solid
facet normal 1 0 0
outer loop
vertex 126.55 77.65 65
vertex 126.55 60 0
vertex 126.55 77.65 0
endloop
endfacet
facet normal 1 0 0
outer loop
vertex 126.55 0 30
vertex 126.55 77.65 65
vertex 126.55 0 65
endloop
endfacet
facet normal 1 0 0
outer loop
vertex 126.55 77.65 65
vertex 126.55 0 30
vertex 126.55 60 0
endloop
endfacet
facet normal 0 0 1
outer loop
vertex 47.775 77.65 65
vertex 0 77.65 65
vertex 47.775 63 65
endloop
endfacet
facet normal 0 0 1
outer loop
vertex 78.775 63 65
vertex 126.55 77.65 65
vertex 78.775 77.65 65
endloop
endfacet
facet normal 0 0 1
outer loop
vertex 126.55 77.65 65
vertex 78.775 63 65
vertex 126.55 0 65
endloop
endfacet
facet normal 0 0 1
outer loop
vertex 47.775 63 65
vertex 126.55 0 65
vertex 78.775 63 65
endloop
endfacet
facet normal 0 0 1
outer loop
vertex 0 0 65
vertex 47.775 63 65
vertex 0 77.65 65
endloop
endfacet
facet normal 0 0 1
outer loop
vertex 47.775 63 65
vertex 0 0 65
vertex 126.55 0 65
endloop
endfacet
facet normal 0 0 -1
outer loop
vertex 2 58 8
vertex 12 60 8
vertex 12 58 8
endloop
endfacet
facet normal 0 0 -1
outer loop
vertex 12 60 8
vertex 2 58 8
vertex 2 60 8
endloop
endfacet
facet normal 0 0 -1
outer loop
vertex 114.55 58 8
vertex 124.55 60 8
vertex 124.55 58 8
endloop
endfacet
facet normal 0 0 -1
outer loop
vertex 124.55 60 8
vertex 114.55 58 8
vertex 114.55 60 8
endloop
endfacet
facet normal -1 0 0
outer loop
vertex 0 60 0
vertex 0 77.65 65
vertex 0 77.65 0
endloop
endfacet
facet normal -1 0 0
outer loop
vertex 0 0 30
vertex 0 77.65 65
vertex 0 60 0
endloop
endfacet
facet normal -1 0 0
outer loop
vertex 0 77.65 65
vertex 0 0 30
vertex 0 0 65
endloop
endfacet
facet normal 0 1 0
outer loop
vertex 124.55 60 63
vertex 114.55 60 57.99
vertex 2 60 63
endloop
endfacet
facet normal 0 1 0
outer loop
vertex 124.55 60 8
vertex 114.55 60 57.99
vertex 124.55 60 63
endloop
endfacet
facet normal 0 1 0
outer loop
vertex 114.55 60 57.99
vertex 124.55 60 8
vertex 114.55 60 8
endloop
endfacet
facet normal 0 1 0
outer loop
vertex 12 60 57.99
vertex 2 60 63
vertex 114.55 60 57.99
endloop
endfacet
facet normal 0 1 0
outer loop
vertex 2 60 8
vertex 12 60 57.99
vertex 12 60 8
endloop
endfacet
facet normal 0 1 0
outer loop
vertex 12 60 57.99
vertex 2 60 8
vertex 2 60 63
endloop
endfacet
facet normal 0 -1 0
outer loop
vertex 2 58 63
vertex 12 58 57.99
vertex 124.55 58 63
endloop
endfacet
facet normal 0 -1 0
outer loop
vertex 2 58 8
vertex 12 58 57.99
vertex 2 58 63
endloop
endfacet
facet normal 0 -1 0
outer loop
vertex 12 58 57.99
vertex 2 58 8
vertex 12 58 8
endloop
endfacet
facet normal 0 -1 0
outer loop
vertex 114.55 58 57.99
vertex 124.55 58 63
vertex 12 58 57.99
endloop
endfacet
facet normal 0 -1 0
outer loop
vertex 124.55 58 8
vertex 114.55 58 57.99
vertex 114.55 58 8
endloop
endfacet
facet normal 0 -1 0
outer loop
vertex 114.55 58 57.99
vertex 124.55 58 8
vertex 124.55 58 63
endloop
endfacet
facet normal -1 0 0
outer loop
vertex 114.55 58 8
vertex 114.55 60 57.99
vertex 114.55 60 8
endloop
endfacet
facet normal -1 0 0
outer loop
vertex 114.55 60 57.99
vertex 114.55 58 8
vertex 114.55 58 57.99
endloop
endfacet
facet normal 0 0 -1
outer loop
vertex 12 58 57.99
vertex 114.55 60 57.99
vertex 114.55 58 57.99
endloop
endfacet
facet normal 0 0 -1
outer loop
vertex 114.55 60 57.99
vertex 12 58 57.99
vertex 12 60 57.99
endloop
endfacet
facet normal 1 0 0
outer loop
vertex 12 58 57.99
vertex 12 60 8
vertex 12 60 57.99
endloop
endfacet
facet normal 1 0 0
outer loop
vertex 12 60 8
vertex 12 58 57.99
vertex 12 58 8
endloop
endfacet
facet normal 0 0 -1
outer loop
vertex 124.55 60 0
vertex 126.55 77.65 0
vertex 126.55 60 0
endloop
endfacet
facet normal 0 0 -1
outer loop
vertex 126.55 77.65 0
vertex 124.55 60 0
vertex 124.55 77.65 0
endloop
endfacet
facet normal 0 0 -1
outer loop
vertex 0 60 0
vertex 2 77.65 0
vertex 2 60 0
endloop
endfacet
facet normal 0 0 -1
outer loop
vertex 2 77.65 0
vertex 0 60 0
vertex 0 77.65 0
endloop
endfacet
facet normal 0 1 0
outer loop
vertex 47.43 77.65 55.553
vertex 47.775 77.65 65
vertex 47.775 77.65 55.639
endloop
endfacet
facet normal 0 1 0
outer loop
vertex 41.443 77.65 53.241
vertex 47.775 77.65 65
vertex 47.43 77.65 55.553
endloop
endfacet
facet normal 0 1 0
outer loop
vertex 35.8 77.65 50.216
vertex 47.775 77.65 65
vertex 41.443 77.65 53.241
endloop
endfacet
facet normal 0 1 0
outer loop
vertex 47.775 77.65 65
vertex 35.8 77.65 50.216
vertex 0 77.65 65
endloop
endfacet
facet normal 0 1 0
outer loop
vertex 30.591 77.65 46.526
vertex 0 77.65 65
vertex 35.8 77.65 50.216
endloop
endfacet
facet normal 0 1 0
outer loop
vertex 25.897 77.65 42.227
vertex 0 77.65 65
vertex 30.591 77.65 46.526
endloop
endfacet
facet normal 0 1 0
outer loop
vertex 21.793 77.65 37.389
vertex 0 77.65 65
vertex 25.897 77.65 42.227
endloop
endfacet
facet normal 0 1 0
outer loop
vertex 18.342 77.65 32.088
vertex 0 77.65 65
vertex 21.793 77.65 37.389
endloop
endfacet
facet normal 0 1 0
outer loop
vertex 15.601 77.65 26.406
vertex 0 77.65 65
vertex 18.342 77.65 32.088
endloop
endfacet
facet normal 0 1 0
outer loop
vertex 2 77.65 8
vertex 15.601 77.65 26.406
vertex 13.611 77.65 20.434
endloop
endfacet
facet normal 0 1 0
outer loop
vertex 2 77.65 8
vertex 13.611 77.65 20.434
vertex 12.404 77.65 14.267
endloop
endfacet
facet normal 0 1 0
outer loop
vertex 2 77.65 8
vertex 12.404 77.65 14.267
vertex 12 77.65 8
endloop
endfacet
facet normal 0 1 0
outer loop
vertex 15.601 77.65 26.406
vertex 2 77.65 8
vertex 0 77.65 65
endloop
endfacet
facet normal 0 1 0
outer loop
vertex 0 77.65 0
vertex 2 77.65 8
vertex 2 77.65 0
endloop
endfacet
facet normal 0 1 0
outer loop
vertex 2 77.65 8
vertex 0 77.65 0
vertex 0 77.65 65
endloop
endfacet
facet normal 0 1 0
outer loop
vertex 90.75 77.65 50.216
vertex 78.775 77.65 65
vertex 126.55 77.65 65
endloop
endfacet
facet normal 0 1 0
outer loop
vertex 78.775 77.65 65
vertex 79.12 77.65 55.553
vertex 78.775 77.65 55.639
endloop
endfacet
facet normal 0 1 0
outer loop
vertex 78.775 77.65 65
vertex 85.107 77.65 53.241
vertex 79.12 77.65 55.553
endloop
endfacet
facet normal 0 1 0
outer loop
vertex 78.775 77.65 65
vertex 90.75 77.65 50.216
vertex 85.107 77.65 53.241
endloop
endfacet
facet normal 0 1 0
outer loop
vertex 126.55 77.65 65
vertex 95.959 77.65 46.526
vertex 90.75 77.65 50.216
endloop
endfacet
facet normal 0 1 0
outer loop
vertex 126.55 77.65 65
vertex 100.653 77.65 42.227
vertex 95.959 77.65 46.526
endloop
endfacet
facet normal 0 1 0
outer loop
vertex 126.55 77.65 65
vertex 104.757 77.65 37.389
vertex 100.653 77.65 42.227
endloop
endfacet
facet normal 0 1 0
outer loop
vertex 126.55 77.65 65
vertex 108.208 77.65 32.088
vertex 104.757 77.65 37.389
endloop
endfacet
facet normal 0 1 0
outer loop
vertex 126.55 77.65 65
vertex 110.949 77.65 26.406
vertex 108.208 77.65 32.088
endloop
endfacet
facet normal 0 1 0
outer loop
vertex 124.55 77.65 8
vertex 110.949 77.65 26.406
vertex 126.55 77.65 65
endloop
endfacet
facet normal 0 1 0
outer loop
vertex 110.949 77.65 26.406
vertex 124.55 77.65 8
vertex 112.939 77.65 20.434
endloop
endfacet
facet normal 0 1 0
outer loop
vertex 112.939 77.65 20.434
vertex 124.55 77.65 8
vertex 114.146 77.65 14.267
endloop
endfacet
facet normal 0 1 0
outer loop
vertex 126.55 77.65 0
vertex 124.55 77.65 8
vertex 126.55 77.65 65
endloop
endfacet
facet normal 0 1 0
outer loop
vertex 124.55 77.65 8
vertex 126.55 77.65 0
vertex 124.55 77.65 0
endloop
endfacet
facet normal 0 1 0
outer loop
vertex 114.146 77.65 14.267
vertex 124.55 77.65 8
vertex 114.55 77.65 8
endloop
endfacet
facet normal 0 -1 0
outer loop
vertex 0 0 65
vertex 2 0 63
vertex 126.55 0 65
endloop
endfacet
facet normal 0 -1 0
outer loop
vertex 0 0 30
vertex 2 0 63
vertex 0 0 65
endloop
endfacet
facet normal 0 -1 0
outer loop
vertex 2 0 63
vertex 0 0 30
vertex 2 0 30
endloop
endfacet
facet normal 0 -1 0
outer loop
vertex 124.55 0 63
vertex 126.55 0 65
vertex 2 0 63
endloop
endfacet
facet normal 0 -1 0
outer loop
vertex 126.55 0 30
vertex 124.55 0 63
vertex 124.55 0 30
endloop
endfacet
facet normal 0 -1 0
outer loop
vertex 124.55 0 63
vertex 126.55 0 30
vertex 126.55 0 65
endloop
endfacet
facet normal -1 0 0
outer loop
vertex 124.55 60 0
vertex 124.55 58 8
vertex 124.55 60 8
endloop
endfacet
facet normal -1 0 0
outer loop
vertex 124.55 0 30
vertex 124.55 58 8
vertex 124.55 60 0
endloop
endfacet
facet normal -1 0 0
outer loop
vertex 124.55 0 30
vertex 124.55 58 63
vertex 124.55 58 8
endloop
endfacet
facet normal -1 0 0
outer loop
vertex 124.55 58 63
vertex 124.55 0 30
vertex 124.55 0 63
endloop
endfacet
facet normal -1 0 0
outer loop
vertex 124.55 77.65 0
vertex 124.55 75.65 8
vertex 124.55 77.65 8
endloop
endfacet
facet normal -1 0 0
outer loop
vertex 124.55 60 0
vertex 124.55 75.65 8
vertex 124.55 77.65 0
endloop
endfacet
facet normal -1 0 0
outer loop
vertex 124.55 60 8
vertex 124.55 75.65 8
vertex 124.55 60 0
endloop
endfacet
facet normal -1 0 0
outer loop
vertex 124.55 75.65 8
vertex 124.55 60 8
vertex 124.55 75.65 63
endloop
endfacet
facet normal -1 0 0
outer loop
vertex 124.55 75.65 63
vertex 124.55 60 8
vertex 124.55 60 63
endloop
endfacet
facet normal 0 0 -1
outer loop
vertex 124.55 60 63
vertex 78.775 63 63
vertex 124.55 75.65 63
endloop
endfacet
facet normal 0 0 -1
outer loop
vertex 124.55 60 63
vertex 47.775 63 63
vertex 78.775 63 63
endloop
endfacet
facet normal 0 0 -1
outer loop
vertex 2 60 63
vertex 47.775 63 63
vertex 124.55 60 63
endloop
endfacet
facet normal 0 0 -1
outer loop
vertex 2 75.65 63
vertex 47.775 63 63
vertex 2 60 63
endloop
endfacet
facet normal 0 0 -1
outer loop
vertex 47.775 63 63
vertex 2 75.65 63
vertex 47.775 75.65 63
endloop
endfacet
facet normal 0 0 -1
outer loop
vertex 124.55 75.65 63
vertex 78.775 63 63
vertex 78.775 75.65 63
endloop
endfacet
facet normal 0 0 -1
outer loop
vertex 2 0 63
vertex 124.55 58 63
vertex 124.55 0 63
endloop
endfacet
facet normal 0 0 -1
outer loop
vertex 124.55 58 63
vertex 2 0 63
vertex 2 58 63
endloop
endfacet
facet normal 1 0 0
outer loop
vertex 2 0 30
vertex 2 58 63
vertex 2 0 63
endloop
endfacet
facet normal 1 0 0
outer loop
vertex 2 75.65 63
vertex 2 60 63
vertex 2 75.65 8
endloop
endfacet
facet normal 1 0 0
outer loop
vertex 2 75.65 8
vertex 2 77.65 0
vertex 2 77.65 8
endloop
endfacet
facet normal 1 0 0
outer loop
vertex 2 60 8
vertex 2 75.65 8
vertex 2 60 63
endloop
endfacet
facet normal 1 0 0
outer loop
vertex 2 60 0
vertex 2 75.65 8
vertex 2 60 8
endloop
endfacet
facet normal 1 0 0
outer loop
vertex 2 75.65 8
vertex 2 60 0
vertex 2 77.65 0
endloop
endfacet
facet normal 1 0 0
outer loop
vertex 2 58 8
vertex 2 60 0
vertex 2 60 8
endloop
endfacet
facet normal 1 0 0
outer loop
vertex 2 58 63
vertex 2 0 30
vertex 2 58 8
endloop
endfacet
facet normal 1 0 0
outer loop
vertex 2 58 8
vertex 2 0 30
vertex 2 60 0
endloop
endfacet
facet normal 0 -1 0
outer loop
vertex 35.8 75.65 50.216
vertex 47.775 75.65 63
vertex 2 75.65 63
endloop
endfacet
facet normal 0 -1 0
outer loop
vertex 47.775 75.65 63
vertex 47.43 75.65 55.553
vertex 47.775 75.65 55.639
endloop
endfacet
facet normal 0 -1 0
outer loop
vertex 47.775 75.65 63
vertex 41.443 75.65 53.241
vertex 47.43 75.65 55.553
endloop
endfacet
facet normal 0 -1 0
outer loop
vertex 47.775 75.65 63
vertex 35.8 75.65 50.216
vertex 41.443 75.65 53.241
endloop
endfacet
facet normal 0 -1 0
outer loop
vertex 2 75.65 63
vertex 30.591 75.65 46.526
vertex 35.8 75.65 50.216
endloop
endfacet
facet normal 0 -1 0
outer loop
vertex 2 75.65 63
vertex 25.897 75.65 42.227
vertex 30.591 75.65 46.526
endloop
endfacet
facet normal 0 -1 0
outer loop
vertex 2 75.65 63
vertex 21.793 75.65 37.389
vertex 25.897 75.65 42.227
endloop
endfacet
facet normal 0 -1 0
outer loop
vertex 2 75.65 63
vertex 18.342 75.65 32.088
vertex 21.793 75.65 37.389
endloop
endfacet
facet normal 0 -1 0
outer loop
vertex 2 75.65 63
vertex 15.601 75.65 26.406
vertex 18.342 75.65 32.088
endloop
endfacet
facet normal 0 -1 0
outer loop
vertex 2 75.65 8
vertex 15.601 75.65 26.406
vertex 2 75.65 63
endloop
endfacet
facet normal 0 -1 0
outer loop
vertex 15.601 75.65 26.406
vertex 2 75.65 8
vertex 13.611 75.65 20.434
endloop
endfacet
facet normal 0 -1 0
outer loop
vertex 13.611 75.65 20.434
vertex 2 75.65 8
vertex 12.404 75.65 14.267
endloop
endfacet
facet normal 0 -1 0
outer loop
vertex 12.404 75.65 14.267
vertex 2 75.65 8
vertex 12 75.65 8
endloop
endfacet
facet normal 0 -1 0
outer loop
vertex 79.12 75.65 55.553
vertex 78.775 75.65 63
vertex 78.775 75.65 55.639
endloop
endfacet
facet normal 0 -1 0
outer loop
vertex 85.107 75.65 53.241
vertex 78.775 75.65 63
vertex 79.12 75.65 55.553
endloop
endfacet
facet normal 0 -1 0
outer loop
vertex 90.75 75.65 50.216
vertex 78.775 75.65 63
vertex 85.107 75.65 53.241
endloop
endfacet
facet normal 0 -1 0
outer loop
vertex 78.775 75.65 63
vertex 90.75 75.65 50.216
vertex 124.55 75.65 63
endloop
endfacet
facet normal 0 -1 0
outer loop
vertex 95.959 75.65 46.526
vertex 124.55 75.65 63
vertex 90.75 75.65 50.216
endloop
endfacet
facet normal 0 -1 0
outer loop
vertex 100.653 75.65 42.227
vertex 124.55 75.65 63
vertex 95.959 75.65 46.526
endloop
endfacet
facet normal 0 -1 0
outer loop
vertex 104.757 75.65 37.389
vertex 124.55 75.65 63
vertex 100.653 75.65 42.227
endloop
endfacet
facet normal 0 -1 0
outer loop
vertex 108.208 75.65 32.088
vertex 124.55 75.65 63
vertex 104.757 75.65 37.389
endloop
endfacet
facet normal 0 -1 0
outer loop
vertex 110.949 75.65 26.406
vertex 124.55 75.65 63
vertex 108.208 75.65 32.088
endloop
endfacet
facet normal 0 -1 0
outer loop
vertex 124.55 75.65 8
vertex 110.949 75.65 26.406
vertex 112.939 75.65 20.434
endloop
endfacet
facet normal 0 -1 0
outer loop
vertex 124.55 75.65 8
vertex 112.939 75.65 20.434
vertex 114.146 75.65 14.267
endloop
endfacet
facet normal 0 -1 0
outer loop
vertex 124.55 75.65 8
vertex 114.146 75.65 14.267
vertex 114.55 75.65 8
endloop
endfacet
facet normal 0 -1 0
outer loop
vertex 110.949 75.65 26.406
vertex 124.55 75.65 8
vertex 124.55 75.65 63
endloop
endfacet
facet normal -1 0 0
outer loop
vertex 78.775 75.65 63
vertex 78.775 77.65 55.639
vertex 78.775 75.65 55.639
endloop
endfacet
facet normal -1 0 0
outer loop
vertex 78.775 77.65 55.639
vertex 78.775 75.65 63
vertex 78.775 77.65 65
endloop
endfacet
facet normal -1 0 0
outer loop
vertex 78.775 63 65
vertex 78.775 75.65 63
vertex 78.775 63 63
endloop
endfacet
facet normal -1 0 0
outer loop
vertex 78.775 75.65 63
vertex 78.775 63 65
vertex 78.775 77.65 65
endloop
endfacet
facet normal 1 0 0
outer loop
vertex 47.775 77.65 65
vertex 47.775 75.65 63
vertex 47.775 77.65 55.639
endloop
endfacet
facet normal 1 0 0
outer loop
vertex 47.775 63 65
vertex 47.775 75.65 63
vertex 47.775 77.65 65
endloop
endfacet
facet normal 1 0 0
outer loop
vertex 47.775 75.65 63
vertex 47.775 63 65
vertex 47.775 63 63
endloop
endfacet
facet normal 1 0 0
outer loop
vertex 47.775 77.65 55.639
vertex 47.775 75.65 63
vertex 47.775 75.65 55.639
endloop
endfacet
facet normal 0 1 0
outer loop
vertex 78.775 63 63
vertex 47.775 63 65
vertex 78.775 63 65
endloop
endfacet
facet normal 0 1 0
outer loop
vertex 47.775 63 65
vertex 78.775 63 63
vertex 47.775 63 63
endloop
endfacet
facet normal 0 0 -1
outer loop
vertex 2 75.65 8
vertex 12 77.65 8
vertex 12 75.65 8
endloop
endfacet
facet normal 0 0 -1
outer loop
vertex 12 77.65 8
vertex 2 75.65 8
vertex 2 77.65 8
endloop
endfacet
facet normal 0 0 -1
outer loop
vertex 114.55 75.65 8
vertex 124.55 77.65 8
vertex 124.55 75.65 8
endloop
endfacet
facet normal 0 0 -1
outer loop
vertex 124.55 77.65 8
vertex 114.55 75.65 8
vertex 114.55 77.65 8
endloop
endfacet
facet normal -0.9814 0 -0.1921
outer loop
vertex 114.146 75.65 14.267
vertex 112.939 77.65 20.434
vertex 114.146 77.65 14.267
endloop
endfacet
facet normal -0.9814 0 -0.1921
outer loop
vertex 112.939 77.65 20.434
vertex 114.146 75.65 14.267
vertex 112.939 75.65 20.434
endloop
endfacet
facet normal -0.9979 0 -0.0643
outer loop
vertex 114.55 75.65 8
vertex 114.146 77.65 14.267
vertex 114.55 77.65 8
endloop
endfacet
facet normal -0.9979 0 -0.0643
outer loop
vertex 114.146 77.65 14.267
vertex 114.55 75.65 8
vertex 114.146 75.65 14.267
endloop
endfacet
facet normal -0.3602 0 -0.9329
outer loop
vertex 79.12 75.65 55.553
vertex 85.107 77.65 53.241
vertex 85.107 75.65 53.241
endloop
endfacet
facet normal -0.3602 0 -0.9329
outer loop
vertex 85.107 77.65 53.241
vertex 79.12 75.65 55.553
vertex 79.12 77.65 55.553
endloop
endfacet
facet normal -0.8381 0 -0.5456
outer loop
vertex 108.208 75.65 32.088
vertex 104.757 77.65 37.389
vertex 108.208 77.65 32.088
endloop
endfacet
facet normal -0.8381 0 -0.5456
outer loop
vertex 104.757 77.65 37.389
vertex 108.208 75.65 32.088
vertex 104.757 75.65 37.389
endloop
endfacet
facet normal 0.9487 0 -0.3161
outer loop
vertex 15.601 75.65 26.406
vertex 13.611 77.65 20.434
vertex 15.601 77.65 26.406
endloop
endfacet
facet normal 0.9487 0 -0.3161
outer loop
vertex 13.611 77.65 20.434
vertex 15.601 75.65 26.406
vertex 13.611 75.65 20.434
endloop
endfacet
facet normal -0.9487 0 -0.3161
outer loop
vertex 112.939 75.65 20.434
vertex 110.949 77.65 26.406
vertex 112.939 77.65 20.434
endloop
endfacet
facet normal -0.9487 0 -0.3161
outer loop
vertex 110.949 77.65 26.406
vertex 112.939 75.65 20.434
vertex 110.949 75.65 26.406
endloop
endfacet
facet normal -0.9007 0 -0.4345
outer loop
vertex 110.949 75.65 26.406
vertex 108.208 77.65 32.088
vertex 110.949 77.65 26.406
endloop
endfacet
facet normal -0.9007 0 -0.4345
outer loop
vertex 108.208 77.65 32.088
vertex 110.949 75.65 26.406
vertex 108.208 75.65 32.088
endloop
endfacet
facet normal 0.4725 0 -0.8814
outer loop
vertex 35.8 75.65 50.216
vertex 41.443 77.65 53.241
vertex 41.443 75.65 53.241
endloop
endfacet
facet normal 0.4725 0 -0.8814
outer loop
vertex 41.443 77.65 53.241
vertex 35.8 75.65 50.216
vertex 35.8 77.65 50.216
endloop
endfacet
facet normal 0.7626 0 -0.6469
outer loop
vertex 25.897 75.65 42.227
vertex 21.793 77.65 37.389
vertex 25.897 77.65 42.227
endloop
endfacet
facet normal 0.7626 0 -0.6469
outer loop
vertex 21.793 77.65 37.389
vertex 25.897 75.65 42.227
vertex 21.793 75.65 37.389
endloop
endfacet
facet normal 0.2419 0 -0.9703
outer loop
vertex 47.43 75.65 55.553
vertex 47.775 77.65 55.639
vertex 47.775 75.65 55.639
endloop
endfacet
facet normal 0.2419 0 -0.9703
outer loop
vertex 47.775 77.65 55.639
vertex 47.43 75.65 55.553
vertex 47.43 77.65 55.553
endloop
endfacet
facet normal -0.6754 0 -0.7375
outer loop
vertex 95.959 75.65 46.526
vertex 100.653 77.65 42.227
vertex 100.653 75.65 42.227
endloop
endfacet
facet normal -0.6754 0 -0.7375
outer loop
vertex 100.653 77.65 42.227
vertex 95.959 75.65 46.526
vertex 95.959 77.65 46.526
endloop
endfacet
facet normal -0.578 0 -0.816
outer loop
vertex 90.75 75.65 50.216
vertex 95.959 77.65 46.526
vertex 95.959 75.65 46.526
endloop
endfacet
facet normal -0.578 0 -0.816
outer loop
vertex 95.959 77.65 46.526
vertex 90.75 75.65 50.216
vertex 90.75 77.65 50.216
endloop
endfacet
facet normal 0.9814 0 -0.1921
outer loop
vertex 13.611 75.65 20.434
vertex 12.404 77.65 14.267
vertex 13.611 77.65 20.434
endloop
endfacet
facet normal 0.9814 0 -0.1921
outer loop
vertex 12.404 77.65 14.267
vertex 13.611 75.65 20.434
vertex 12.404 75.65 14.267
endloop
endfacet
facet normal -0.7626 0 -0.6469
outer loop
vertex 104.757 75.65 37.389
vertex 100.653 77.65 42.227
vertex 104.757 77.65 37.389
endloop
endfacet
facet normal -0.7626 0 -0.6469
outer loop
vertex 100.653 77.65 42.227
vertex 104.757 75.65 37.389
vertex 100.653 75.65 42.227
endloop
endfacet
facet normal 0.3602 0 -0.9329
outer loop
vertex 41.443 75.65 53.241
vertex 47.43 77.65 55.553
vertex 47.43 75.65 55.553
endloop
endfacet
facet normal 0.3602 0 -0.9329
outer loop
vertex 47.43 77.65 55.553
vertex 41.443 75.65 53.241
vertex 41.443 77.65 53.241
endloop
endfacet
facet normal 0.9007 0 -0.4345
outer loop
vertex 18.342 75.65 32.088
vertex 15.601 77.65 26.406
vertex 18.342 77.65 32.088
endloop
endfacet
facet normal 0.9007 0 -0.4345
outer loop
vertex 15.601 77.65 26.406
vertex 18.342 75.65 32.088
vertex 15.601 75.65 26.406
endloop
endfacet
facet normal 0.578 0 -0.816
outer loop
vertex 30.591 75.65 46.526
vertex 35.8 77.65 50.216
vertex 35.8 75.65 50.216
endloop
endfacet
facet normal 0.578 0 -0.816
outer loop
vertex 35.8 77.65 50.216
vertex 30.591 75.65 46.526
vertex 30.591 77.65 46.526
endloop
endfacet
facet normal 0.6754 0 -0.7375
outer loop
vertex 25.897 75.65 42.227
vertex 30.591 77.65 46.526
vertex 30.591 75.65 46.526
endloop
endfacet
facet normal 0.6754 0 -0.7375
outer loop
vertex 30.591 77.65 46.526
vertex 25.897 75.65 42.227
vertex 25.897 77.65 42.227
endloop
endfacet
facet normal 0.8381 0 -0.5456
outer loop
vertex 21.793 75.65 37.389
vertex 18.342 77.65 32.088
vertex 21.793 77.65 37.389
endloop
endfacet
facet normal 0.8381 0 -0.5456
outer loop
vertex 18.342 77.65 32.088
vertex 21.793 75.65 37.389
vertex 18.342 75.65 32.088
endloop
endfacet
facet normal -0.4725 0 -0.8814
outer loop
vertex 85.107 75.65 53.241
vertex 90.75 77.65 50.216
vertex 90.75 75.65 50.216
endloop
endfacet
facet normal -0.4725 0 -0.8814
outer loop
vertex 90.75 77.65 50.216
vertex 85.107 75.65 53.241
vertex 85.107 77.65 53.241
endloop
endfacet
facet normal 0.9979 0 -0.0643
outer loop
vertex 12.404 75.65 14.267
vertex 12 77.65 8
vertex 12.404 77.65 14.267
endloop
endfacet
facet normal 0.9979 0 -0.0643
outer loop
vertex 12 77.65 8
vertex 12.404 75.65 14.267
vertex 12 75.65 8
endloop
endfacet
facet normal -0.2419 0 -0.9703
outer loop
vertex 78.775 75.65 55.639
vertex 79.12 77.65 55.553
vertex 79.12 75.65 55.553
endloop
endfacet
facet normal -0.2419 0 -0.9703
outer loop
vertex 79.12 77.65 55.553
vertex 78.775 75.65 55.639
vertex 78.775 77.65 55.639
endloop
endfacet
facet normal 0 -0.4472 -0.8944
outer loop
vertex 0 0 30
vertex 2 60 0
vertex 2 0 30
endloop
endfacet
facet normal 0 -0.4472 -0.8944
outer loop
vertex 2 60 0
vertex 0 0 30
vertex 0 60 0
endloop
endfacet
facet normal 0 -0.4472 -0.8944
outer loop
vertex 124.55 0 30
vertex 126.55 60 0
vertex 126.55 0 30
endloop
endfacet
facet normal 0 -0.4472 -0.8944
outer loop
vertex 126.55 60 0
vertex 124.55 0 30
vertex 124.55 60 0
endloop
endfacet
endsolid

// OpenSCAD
//by Eric Hughes

//Roundness - 20 for testing, 50 for printing
$fn=50;

//Thickness of panes
thick = 2;//

//GPS Width
bbx = 122.55;

//How far the shade extends out from the face
bby = 60;

//GPS thickness (gap needed to slide down from top)
GThick = 15.65; 

// How far down the left and right shade extends 
z = 63;

//holding bracket lip on x (sides).  How much covers face.
hx = 10; 

//holding bracket lip in Z (top)
hz = 5;

//how far down holding bracket goes (if hbd=z then all the way)(don't let it cover your USB power jack)
hbd = 55; 

//width of cut needed for back support bracket
bsx = 31;

//how much of GThick can stay without bracket getting in the way.  If it overhangs the face this number should be negative
bsy = 3;

//from the bottom, how much of the shade corder should be cut off in the z direction (height)
crnrz=30;

//from the bottom, how much of the shade corner should be cut off in the y direction (depth)
crnry=60;


finalizeshade();
//buildshade();

module finalizeshade(){
difference(){
    moveshade();
    cornercut();
    }}

module moveshade(){
translate([(bbx+2*thick)/2, (bby+GThick+thick)/2, (z+thick)/2]){
buildshade();
}}

module cornercut(){
rotate([90,0,90])
//rotate(90)
linear_extrude(height=500){
polygon(points=[[0,0],[crnry,0],[0,crnrz]]);
}}
   
module buildshade(){
    difference(){
    holder();
    cutblock2();
        }
difference(){
    baseblock();
    cutblock1();
    backsupportcut();
    backcut();
    backcircularcut();
}}

module baseblock(){
    cube([bbx+2*thick, bby+GThick+thick, z+thick],center=true);
}

module cutblock1(){
    translate([0,-thick,-thick]){
    cube([bbx, bby+GThick+thick , z+thick],center=true);
}}

module holder(){
     translate([0,((bby+GThick)/2)-thick-GThick,(z-hbd)/2]){
    cube([bbx+2*thick, thick, z+thick-(z-hbd)],center=true);
}}

module cutblock2(){
    translate([0,-thick-.01,-thick-hz-.01]){
    cube([bbx-2*hx, bby+GThick+thick, z+thick],center=true);
}}

module backsupportcut(){
    translate([0,25+(bby/2)+(GThick/2)+(thick/2)-thick-(GThick-bsy),0]){
    cube([bsx,50, 2*z],center=true);
    }}
    
module backcut(){
    translate([0,0,-hbd-thick]){
        cube([bbx, bby+GThick+thick, z+thick],center=true);
}}

module backcircularcut(){
    translate([0,.5+(bby+GThick+thick)/2,(z+thick)/2-thick-hbd]){
    rotate([90,0,0]){
        scale([1,(hbd-hz)/((bbx-2*hx)/2)])cylinder(h=thick+1, d=(bbx-2*hx));
}}}
